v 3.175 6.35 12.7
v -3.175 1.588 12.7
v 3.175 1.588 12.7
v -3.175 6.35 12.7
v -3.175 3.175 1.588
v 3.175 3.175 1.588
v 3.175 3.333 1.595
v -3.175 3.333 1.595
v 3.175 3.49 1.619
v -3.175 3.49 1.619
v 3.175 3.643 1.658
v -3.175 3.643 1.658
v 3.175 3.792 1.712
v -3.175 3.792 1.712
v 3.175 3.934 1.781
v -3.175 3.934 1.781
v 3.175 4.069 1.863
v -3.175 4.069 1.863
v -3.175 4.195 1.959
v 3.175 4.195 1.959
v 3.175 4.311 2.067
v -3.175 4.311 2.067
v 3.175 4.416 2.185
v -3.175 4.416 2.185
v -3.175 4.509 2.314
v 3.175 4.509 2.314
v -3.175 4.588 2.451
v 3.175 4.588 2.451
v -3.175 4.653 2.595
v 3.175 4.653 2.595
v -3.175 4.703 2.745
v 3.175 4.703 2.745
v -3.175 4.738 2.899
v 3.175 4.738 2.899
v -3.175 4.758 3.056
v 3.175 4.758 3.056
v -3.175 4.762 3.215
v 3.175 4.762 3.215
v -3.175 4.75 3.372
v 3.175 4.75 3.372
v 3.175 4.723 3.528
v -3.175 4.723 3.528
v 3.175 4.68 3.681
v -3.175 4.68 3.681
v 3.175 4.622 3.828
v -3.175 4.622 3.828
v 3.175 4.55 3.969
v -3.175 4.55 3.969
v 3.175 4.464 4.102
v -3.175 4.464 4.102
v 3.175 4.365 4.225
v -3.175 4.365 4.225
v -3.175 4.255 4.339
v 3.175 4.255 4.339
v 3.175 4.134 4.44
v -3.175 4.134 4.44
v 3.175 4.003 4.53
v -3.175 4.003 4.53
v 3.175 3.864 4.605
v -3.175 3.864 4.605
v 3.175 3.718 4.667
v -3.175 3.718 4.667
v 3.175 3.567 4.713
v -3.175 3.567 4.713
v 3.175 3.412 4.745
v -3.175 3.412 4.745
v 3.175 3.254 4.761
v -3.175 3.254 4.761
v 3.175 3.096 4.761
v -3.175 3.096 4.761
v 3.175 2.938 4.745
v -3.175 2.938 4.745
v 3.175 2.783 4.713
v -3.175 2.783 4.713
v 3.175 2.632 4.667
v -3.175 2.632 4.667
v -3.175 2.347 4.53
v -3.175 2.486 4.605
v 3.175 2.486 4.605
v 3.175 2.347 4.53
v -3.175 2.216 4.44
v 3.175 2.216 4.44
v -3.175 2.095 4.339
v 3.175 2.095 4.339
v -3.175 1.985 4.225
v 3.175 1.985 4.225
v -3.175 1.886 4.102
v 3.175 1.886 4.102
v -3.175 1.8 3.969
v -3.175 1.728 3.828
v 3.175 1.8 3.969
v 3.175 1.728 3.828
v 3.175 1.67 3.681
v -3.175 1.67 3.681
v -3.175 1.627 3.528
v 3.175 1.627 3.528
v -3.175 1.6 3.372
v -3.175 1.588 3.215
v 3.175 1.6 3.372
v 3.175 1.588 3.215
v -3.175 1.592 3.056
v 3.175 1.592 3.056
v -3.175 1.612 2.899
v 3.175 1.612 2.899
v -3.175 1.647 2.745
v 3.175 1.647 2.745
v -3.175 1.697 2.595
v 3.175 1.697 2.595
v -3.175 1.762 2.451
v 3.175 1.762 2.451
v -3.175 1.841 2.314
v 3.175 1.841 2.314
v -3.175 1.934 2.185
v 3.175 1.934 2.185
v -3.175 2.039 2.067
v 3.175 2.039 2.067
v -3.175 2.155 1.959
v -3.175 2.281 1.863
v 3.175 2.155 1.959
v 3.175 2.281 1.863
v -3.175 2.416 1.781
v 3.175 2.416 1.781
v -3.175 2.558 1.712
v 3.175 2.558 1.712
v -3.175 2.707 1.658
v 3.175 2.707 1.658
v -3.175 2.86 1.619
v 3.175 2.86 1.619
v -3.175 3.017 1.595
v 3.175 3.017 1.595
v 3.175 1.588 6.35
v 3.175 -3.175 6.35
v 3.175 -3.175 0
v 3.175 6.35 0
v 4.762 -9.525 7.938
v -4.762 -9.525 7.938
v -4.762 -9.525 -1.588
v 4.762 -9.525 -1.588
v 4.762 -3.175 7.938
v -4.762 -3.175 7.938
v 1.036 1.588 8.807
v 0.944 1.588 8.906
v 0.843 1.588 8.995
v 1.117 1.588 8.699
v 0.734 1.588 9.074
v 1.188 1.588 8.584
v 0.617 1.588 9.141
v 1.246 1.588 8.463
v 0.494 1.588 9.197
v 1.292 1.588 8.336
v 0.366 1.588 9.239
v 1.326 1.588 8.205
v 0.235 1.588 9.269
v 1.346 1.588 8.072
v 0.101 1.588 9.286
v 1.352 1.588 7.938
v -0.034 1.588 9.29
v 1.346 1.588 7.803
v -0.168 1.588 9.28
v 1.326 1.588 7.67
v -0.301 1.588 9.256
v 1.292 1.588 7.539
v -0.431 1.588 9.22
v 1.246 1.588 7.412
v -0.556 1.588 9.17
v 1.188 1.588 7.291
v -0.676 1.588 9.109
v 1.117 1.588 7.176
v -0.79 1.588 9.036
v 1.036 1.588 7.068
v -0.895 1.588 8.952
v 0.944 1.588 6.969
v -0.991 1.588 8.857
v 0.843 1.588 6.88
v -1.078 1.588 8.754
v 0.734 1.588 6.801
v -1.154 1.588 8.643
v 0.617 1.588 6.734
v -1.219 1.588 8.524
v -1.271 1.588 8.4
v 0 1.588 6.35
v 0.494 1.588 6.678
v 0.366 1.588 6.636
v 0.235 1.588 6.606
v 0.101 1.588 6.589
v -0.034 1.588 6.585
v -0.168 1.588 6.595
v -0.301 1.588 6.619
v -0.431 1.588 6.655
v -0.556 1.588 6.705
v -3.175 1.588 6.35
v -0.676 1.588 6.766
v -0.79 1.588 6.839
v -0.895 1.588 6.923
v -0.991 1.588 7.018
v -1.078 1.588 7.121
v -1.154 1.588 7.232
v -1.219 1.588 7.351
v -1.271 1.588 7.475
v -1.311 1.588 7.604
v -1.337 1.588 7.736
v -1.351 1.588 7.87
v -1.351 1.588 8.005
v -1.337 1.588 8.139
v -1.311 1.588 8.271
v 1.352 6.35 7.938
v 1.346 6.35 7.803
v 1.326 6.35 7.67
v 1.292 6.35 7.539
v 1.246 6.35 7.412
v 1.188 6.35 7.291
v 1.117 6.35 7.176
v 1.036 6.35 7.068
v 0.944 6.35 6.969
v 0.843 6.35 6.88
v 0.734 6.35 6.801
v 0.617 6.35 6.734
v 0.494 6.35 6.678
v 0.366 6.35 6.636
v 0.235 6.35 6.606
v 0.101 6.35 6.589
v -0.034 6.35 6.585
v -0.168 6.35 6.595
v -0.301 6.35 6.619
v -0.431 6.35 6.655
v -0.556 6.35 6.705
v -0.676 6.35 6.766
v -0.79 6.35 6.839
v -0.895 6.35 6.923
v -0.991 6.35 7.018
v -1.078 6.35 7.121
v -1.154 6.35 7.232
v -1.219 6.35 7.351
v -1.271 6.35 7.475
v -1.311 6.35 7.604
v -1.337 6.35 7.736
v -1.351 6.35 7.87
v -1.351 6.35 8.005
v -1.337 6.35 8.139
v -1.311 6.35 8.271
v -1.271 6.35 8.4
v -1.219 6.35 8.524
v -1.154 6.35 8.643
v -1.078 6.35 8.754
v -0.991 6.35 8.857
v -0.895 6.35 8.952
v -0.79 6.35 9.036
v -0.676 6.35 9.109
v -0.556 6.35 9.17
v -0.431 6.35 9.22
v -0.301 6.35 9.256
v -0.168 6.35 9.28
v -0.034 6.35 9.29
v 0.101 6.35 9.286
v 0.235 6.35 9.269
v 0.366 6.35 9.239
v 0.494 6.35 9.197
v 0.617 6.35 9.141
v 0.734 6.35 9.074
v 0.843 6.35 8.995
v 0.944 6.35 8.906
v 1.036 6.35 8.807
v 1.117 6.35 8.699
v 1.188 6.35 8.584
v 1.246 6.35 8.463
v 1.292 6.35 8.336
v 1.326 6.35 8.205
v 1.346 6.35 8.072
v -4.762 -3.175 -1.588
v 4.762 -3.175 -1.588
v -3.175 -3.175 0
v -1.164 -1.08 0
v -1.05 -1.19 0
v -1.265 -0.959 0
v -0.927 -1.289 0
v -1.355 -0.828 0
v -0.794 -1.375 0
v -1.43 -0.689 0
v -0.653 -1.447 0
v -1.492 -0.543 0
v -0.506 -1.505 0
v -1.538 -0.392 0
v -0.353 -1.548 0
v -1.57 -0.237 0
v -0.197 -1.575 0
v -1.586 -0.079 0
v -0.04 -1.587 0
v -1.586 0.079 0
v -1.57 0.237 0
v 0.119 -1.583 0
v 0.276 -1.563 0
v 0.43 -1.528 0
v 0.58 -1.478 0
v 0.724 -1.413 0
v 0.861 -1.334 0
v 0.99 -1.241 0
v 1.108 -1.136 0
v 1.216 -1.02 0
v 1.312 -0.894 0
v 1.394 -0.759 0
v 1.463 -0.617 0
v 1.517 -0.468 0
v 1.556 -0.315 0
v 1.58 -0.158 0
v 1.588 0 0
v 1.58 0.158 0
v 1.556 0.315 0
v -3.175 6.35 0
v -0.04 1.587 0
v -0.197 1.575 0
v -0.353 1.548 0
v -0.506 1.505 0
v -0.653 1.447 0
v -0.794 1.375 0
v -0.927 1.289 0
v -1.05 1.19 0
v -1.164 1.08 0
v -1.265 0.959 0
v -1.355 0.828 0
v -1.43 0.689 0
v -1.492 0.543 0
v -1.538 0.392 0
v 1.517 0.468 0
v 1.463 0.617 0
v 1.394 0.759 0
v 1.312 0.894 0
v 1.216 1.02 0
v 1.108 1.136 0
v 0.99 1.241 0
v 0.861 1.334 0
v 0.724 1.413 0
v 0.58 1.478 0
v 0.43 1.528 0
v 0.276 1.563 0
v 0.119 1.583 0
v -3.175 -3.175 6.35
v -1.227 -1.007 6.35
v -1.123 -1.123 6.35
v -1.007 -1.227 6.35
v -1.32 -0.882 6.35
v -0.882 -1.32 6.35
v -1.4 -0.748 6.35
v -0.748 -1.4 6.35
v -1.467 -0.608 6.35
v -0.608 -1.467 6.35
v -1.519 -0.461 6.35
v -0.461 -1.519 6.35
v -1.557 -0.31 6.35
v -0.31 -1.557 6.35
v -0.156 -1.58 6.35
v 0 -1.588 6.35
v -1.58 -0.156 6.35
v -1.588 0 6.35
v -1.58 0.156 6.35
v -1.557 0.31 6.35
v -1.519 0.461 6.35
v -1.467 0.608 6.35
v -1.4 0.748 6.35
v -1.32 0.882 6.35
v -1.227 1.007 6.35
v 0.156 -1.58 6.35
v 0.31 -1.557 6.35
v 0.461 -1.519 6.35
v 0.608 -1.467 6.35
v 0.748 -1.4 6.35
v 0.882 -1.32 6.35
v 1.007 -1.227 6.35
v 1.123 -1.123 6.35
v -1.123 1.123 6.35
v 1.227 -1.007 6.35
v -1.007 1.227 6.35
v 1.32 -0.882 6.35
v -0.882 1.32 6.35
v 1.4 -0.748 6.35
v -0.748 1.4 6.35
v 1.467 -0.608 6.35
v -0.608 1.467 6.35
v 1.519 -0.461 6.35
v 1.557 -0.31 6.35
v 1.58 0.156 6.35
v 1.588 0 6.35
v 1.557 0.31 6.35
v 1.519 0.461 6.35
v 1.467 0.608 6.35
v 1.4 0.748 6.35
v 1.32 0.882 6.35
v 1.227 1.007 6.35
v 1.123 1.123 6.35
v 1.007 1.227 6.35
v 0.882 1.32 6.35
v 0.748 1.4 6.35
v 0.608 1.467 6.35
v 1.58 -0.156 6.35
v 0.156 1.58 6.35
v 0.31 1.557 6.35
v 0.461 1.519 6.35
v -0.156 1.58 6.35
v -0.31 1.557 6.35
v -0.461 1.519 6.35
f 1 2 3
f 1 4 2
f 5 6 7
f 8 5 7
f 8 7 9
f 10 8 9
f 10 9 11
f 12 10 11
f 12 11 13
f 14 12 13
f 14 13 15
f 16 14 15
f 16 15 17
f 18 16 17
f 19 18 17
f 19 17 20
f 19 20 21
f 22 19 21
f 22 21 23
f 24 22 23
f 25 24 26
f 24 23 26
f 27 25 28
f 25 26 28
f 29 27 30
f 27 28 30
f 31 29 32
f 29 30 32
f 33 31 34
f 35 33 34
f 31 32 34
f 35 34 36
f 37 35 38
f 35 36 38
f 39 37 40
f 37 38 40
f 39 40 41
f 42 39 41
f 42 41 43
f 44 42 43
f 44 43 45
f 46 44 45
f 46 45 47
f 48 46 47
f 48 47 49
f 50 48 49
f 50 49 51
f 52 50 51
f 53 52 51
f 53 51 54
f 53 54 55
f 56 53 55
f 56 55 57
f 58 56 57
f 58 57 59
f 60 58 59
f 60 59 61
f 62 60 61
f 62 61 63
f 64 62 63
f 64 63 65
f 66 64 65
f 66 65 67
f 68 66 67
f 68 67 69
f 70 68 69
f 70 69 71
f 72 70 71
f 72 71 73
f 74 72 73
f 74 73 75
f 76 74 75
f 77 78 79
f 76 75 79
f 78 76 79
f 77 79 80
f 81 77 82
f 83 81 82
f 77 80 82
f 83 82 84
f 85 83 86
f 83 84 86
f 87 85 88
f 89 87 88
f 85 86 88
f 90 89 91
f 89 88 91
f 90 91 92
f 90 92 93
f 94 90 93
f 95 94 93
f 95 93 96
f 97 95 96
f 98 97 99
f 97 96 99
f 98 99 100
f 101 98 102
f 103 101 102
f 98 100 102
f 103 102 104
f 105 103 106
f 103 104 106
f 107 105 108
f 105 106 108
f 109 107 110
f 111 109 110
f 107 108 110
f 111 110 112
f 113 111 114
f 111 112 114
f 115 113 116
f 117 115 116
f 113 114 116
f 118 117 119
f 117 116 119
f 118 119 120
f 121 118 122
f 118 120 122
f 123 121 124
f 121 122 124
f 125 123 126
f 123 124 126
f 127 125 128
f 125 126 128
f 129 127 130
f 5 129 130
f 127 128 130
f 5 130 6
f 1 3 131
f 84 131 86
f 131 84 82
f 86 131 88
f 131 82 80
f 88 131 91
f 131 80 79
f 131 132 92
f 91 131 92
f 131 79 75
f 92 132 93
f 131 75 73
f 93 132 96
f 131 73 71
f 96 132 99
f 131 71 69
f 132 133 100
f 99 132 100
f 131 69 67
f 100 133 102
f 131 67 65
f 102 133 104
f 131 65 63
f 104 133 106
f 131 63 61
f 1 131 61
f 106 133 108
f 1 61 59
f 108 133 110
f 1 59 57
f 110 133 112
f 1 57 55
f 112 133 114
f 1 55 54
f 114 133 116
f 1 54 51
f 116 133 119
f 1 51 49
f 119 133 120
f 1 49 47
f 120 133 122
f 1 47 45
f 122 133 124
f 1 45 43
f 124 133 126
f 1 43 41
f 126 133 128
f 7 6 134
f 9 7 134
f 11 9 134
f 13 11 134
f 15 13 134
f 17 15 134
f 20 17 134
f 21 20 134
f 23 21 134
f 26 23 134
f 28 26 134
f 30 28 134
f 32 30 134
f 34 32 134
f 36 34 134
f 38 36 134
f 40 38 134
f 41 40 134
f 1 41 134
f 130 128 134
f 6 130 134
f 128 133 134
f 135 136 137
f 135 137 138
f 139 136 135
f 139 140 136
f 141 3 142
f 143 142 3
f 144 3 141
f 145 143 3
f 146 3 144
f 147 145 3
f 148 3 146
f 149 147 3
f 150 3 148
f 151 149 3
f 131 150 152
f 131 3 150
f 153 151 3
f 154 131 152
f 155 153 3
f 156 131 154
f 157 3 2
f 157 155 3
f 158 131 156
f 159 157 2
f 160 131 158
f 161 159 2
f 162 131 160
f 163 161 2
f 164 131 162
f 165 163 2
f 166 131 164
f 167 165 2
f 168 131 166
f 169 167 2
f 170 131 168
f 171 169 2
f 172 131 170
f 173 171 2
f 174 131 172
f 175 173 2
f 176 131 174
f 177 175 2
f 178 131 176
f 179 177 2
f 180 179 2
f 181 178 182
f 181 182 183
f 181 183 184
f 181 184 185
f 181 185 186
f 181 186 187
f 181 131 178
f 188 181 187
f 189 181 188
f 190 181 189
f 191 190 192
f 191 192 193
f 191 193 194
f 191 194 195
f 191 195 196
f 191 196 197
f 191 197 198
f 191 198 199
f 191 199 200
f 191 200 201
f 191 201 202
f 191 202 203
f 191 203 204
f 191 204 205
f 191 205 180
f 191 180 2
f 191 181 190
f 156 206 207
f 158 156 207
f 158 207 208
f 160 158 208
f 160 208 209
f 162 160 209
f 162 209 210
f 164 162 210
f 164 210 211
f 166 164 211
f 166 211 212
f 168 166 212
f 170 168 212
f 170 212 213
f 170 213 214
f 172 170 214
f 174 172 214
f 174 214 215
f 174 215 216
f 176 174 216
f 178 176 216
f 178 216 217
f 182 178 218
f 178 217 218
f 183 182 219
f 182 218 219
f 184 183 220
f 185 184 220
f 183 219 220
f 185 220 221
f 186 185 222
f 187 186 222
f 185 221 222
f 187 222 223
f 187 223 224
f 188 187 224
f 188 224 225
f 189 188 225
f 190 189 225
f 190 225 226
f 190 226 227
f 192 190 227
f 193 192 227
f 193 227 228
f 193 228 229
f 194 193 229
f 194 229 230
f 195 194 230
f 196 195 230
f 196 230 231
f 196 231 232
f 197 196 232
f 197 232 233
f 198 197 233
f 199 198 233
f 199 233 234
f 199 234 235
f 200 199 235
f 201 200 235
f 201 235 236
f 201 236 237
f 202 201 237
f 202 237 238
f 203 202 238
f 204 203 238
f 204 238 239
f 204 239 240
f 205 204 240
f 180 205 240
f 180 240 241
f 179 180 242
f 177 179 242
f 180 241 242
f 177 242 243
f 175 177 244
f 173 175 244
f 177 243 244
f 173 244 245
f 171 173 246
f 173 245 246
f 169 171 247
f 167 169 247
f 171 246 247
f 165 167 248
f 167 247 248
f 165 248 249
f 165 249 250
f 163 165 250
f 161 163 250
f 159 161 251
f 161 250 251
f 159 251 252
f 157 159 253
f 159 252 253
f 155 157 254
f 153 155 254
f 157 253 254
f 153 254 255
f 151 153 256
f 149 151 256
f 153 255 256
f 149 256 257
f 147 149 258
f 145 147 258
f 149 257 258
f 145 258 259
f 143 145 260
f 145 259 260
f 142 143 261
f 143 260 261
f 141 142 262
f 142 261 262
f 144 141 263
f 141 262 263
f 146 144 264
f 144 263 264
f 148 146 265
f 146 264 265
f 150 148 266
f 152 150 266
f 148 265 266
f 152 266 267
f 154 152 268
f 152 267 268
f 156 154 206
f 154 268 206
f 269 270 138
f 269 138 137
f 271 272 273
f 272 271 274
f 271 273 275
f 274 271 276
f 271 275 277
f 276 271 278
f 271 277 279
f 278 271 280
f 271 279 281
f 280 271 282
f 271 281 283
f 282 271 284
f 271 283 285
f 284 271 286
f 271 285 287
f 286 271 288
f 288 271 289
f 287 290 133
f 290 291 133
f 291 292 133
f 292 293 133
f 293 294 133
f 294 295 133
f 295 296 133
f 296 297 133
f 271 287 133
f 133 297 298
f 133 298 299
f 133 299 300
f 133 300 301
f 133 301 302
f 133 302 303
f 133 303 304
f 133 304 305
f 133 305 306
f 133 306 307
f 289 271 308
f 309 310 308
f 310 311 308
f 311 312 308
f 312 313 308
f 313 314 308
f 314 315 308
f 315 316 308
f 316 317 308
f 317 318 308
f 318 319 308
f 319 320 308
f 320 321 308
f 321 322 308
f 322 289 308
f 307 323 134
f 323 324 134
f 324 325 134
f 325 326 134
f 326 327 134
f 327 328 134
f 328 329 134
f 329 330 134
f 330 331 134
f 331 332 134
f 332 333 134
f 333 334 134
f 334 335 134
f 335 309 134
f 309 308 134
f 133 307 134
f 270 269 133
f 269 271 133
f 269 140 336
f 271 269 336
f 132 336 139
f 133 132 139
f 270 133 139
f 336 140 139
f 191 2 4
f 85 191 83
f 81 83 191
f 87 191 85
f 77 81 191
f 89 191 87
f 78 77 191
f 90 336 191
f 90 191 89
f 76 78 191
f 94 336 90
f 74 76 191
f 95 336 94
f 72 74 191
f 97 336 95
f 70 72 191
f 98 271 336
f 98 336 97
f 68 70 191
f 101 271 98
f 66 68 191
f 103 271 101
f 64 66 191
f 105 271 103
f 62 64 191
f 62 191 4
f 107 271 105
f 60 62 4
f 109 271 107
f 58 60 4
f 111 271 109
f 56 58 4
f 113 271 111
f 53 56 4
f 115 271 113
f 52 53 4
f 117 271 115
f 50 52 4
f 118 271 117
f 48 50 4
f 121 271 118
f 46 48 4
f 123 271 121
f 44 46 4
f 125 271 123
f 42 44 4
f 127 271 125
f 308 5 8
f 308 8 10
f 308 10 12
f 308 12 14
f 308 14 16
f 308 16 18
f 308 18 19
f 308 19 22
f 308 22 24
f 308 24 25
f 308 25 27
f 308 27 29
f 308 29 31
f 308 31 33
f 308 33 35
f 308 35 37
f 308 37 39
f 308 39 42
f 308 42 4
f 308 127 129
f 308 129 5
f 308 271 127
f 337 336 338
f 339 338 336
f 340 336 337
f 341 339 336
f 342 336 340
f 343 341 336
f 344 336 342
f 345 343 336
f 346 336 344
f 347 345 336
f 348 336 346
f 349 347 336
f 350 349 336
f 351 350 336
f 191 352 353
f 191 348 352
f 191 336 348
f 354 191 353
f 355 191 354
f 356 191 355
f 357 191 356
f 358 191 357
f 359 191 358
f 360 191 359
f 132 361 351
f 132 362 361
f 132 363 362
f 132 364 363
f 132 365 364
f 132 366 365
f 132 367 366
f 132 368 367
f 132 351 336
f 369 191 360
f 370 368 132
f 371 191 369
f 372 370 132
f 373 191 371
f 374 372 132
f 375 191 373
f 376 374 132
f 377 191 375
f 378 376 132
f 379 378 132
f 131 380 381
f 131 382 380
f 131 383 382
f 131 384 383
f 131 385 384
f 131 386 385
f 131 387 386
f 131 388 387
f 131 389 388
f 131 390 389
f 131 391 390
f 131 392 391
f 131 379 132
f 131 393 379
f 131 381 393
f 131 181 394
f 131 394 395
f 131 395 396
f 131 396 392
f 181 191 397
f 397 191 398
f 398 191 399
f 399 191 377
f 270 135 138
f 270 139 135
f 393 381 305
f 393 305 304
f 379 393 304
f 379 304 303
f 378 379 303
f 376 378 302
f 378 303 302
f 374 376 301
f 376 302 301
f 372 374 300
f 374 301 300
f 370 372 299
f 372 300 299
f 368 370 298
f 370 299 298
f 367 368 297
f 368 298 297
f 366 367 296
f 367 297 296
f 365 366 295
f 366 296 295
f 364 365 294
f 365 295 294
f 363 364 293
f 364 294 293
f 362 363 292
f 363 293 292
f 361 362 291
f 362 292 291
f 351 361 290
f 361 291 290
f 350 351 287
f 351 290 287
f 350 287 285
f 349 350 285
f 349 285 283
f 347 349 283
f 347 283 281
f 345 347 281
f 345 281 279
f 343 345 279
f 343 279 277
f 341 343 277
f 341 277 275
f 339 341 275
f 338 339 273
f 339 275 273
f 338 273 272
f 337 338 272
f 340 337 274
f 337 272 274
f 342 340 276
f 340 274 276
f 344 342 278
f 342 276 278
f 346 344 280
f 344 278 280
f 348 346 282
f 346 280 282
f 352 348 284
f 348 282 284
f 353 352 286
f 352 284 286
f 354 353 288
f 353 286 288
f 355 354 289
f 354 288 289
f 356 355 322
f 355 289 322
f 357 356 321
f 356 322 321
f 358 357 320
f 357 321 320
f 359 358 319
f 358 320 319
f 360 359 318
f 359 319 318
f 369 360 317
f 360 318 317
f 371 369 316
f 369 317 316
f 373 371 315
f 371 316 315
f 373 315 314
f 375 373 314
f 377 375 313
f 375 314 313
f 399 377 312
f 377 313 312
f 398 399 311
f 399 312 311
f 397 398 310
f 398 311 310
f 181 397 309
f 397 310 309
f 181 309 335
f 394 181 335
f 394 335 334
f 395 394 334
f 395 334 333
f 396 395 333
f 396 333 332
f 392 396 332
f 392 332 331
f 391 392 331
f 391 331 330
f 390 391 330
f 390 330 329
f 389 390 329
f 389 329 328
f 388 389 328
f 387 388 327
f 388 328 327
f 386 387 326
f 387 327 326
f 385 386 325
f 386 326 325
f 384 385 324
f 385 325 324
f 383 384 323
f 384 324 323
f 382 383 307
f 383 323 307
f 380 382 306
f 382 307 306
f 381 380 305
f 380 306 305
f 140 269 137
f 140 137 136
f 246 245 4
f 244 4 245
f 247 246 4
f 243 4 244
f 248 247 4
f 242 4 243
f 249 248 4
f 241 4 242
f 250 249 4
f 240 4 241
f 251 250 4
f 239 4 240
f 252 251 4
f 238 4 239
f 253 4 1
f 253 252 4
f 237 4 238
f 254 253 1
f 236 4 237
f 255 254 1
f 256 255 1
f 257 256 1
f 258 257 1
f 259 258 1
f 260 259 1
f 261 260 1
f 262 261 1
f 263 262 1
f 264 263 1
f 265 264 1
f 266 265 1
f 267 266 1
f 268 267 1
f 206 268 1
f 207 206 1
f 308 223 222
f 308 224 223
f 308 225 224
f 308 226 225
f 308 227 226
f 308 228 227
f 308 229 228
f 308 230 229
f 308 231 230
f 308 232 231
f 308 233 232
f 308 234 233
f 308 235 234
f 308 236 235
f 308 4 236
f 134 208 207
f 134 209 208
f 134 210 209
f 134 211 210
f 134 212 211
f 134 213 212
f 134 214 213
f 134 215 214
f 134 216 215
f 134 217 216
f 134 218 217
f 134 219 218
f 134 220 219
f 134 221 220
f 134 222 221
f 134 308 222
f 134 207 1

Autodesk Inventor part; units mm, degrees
ref_plane "YZ Plane" through (0, 0, 0) normal (1, 0, 0) x (0, 1, 0)
ref_plane "XZ Plane" through (0, 0, 0) normal (0, 1, 0) x (-1, 0, 0)
ref_plane "XY Plane" through (0, 0, 0) normal (0, 0, 1) x (1, 0, 0)
sketch "Sketch1" plane through (0, 0, 0) normal (0, 0, 1) x (1, 0, 0)
  circle A0 centre (0, 0) radius 1.5875
  line L0 (-3.175, -3.175) -> (3.175, -3.175)
  line L1 (3.175, -3.175) -> (3.175, 6.35)
  line L2 (3.175, 6.35) -> (-3.175, 6.35)
  line L3 (-3.175, 6.35) -> (-3.175, -3.175)
  dimension "d0" = 3.175
  dimension "d2" = 6.35
  dimension "d3" = 3.175
  dimension "d4" = 3.175
  dimension "d5" = 9.525
extrude "Extrusion1" add sketch "Sketch1" along normal blind 6.35
sketch "Sketch2" plane through (3.175, -3.175, 0) normal (1, 0, 0) x (0, 0, -1)
  line L0 (0, 9.525) -> (-6.35, 9.525) projected
  circle A0 centre (-3.175, 6.35) radius 1.5875
  point P0 (0, 3.175)
  dimension "d8" = 3.175
  dimension "d9" = 3.175
extrude "Extrusion2" cut sketch "Sketch2" against normal up to next
sketch "Sketch3" plane through (0, 0, 6.35) normal (0, 0, 1) x (1, 0, 0)
  line L0 (3.175, -3.175) -> (3.175, 6.35) projected
  line L1 (-3.175, 6.35) -> (3.175, 6.35)
  line L2 (3.175, 6.35) -> (3.175, 1.5875)
  line L3 (3.175, 1.5875) -> (-3.175, 1.5875)
  line L4 (-3.175, 1.5875) -> (-3.175, 6.35)
  point P0 (3.175, 0)
extrude "Extrusion3" add sketch "Sketch3" along normal blind 6.35
sketch "Sketch4" plane through (-3.175, 6.35, 0) normal (0, 1, 0) x (1, 0, 0)
  circle A0 centre (3.175, -7.9375) radius 1.3525
  line L0 (6.35, 0) -> (0, 0) projected
  point P0 (3.175, 0)
  dimension "d15" = 2.7051
  dimension "d26" = 7.9375
extrude "Extrusion4" cut sketch "Sketch4" against normal blind 6.35
sketch "Sketch5" plane through (-3.175, -3.175, 0) normal (0, -1, 0) x (1, 0, 0)
  line L0 (0, 0) -> (6.35, 0) projected
  line L1 (6.35, 0) -> (6.35, 6.35) projected
  line L2 (0, 6.35) -> (6.35, 6.35) projected
  line L3 (0, 0) -> (0, 6.35) projected
  line L4 (-1.5875, 7.9375) -> (7.9375, 7.9375)
  line L5 (7.9375, 7.9375) -> (7.9375, -1.5875)
  line L6 (7.9375, -1.5875) -> (-1.5875, -1.5875)
  line L7 (-1.5875, -1.5875) -> (-1.5875, 7.9375)
  point P0 (3.175, 0)
  dimension "d20" = 1.5875
  dimension "d21" = 1.5875
  dimension "d22" = 1.5875
  dimension "d23" = 1.5875
extrude "Extrusion5" add sketch "Sketch5" along normal blind 6.35 contours L3 L2 L1 L0 | L4 L5 L6 L7
properties part number "quad"
